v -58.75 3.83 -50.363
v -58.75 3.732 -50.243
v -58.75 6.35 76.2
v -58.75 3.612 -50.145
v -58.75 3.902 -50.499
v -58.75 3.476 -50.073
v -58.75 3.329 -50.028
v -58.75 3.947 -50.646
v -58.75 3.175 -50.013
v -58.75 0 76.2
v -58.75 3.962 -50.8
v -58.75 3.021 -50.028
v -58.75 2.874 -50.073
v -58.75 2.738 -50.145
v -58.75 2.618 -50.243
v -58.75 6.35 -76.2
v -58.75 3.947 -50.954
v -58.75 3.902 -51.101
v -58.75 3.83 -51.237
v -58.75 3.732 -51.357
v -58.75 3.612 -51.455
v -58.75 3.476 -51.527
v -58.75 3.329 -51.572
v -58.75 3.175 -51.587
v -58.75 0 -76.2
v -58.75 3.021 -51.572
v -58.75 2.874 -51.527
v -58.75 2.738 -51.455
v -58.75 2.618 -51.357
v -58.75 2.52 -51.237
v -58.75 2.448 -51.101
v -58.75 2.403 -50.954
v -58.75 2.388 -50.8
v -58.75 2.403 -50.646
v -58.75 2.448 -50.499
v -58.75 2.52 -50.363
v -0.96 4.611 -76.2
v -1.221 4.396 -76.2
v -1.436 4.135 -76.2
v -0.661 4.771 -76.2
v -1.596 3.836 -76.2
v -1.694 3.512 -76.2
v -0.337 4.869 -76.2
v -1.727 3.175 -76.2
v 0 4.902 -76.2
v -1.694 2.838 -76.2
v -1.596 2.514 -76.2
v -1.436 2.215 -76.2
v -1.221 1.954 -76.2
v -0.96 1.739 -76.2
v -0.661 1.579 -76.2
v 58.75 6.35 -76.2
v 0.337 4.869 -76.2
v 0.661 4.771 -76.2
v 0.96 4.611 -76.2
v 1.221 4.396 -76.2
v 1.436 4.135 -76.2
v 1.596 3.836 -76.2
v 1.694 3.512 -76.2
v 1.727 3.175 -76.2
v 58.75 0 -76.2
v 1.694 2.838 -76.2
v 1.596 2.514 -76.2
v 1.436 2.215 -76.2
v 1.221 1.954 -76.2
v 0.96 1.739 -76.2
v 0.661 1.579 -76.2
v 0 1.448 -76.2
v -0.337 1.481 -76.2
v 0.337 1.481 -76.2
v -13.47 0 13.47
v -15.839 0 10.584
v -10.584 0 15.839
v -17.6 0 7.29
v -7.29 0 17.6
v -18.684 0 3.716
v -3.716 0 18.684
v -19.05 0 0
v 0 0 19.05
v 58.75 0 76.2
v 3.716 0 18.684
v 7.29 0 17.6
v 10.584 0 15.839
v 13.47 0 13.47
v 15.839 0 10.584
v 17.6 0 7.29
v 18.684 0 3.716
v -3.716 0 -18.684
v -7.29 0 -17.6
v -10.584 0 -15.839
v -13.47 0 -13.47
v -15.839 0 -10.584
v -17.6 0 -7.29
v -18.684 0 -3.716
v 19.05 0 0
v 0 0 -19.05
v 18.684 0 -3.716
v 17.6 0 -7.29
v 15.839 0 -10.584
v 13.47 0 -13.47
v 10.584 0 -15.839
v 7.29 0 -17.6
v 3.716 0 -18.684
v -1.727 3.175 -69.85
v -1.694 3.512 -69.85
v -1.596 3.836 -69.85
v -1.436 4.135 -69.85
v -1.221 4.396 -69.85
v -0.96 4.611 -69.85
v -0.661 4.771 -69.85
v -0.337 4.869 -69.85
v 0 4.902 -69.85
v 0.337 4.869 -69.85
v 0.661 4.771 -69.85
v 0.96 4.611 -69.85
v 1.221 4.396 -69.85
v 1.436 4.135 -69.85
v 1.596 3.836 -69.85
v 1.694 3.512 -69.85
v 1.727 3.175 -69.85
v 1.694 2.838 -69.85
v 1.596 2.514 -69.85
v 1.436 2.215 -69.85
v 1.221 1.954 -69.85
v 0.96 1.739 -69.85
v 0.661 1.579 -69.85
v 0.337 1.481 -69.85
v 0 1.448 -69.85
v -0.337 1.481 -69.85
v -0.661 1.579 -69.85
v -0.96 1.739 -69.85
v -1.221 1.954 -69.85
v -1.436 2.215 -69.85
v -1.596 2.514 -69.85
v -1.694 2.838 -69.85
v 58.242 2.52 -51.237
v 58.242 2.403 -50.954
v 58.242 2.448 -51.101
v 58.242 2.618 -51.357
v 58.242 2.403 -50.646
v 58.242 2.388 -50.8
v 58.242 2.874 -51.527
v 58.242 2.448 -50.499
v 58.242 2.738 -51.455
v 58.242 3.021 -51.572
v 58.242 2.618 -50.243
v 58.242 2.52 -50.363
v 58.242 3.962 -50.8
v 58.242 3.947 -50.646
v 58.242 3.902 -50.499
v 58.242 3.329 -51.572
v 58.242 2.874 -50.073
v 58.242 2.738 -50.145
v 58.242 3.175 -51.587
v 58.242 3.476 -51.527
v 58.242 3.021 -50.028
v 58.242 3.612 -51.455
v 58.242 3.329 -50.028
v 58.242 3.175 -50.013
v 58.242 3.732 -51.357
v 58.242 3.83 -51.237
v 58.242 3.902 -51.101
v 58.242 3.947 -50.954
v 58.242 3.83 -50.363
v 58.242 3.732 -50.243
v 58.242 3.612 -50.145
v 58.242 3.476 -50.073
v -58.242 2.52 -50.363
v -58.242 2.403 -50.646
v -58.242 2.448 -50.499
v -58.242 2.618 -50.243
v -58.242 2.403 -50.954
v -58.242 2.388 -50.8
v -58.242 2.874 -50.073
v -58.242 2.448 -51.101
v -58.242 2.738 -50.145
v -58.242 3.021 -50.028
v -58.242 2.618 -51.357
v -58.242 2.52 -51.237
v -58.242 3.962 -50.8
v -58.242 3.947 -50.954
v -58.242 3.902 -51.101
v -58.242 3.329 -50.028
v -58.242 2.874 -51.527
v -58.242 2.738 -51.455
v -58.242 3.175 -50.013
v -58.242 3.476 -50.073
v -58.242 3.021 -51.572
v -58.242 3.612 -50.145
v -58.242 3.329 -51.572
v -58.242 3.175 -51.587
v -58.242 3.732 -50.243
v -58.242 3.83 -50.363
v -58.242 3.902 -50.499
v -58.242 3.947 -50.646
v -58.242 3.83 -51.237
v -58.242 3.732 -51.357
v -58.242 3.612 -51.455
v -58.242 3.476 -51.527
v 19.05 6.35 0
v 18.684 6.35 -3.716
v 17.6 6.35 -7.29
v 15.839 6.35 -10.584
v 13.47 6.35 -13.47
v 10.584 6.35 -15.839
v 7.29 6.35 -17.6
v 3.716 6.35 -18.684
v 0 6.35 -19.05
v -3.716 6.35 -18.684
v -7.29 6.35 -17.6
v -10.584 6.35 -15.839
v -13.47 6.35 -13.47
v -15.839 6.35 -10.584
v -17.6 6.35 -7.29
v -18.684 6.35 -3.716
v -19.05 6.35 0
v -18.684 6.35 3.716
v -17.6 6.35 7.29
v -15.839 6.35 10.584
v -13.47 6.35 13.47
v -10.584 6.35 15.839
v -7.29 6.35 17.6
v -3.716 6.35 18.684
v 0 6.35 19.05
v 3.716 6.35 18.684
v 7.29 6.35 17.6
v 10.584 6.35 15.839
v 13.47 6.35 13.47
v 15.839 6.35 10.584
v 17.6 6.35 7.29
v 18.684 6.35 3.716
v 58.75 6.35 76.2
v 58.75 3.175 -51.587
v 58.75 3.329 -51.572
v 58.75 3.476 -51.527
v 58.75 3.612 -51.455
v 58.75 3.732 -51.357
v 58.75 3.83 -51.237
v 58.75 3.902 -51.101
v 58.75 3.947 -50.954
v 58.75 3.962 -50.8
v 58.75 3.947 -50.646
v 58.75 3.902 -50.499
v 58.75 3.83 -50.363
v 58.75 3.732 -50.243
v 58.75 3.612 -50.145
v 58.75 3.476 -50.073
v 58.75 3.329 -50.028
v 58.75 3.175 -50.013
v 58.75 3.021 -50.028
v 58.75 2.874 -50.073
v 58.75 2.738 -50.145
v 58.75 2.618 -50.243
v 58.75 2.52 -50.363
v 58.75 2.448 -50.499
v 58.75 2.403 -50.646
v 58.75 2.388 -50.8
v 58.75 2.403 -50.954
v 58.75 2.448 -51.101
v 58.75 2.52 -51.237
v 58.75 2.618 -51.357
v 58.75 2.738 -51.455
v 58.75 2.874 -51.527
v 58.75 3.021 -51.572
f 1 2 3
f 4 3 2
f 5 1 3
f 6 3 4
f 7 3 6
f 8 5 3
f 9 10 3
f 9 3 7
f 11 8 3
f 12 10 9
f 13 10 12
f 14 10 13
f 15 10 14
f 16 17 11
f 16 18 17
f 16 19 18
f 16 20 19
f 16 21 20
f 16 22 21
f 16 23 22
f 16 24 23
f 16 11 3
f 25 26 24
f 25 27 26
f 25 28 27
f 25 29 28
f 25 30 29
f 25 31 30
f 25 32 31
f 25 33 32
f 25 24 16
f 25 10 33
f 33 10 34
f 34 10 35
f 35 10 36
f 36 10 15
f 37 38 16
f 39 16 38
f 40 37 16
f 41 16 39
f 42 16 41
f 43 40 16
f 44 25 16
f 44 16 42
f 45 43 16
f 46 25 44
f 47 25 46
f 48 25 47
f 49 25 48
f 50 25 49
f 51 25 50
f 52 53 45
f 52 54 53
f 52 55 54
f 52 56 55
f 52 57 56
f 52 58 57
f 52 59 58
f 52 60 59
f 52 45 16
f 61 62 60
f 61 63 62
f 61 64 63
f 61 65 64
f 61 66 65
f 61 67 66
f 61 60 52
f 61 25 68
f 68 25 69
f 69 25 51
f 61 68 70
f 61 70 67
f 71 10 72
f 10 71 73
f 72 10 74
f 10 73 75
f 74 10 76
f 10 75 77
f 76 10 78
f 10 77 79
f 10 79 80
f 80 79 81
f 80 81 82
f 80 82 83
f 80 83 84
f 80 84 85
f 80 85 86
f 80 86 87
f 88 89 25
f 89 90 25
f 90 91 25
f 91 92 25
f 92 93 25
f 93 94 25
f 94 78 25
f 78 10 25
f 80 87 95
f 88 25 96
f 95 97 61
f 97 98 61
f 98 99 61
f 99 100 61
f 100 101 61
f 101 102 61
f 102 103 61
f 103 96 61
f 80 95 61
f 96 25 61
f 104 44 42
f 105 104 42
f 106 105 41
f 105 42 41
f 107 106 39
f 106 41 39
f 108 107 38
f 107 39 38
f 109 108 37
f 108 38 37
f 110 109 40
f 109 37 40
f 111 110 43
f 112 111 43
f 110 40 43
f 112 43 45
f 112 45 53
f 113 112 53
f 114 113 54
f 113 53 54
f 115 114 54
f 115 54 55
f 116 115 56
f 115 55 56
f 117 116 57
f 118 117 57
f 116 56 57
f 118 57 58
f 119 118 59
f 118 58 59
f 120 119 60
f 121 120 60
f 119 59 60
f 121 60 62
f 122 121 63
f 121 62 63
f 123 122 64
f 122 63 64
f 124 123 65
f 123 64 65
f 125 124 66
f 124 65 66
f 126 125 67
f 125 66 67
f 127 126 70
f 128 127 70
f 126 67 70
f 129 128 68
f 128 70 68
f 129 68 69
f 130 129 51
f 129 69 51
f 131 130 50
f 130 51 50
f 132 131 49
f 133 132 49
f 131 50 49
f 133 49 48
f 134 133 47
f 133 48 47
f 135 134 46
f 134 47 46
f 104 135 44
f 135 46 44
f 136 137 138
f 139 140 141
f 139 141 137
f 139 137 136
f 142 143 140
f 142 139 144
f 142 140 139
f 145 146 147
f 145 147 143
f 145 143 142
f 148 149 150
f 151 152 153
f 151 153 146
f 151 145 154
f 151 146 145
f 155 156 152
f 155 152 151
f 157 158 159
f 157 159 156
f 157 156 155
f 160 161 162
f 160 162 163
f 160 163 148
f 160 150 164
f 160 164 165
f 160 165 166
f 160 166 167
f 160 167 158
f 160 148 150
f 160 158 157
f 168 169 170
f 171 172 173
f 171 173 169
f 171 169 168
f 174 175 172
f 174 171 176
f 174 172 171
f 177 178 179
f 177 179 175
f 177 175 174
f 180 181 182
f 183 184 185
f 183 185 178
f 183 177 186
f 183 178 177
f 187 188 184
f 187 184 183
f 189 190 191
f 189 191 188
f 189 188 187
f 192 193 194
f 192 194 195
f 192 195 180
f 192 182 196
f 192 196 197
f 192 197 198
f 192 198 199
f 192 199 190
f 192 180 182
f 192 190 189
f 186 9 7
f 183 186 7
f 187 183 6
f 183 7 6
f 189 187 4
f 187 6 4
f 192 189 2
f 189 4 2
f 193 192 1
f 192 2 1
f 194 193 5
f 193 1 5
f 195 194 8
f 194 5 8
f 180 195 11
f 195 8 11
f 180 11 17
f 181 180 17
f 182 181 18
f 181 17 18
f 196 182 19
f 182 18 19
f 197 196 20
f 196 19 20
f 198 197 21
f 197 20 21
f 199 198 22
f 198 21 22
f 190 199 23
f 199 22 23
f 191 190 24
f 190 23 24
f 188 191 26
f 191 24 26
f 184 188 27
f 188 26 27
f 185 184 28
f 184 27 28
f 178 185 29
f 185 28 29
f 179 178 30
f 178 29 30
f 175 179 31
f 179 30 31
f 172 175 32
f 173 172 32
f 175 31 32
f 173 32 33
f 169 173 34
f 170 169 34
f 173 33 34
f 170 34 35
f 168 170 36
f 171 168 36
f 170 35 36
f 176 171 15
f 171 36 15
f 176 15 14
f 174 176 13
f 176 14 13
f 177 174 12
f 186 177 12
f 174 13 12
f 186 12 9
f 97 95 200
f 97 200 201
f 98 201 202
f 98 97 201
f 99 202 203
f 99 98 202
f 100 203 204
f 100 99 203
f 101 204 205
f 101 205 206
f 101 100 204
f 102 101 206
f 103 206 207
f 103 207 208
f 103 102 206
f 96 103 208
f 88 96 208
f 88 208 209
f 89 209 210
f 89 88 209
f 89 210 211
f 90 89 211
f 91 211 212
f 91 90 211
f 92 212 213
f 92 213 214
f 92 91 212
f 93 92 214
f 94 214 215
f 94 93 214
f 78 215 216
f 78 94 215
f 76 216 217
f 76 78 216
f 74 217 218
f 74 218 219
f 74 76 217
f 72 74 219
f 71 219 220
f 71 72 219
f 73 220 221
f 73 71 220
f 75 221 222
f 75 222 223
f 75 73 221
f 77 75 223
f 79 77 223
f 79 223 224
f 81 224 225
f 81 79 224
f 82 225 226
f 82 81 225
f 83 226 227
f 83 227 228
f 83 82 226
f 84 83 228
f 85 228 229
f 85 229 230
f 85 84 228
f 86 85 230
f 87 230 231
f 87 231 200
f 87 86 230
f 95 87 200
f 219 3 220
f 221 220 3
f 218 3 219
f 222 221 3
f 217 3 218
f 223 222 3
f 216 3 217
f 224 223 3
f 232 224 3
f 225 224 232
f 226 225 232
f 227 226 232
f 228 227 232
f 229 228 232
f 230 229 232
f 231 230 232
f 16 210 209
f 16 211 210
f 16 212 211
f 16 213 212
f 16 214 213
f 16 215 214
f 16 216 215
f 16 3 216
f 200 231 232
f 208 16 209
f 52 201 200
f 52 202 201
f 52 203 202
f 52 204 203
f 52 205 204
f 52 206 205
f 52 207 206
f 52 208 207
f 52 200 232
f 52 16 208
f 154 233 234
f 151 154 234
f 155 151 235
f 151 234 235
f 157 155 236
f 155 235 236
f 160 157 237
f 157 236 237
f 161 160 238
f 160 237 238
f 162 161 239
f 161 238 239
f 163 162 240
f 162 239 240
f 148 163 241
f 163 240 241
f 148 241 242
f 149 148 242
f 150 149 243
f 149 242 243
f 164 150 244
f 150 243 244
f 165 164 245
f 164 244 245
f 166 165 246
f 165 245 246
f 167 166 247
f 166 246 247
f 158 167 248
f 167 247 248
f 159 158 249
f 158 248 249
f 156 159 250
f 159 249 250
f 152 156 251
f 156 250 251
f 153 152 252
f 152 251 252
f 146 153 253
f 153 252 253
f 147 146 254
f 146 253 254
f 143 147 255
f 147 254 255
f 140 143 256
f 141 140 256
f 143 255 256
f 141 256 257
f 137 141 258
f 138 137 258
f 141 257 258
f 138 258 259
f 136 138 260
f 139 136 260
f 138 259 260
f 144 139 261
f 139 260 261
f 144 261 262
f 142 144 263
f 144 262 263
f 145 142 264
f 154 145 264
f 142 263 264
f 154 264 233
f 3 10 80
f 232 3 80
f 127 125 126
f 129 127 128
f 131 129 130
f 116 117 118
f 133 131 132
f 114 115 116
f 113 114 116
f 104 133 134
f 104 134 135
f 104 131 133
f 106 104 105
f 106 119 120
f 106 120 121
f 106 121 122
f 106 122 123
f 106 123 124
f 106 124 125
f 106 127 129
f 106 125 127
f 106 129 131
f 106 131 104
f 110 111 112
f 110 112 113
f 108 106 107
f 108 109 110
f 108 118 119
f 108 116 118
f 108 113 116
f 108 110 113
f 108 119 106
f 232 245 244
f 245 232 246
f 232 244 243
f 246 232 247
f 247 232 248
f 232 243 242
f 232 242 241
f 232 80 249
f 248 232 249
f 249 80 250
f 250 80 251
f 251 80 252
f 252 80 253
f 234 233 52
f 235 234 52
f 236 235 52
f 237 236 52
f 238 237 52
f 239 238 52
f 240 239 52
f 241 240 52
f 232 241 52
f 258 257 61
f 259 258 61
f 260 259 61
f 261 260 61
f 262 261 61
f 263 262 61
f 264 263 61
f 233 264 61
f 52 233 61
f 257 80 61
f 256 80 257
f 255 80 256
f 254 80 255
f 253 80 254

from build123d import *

# Parameters (mm, degrees)
SKETCH1_W           = 117.5004
SKETCH1_H           = 152.4
SKETCH1_R           = 19.05
BOSS_EXTRUDE1_DEPTH = 6.35
SKETCH3_R           = 0.7874
CUT_EXTRUDE1_DEPTH  = 0.508
SKETCH4_R           = 0.7874
CUT_EXTRUDE2_DEPTH  = 0.508
SKETCH5_R           = 1.7272
CUT_EXTRUDE3_DEPTH  = 6.35


with BuildPart() as part:
    # Sketch1 → Boss-Extrude1 (new body)
    with BuildSketch(Plane(origin=(0, 0, 0), x_dir=(1, 0, 0), z_dir=(0, 1, 0))):
        Rectangle(SKETCH1_W, SKETCH1_H)
        Circle(SKETCH1_R, mode=Mode.SUBTRACT)
    extrude(amount=BOSS_EXTRUDE1_DEPTH)

    # Sketch3 → Cut-Extrude1 (cut)
    with BuildSketch(Plane.ZY.offset(58.7502)):
        with Locations((-50.8, 3.175)):
            Circle(SKETCH3_R)
    extrude(amount=-CUT_EXTRUDE1_DEPTH, mode=Mode.SUBTRACT)

    # Sketch4 → Cut-Extrude2 (cut)
    with BuildSketch(Plane(origin=(58.7502, 0, 0), x_dir=(0, 0, -1), z_dir=(1, 0, 0))):
        with Locations((50.8, 3.175)):
            Circle(SKETCH4_R)
    extrude(amount=-CUT_EXTRUDE2_DEPTH, mode=Mode.SUBTRACT)

    # Sketch5 → Cut-Extrude3 (cut)
    with BuildSketch(Plane(origin=(0, 0, -76.2), x_dir=(-1, 0, 0), z_dir=(0, 0, -1))):
        with Locations((0, 3.175)):
            Circle(SKETCH5_R)
    extrude(amount=-CUT_EXTRUDE3_DEPTH, mode=Mode.SUBTRACT)


solid = part.part
